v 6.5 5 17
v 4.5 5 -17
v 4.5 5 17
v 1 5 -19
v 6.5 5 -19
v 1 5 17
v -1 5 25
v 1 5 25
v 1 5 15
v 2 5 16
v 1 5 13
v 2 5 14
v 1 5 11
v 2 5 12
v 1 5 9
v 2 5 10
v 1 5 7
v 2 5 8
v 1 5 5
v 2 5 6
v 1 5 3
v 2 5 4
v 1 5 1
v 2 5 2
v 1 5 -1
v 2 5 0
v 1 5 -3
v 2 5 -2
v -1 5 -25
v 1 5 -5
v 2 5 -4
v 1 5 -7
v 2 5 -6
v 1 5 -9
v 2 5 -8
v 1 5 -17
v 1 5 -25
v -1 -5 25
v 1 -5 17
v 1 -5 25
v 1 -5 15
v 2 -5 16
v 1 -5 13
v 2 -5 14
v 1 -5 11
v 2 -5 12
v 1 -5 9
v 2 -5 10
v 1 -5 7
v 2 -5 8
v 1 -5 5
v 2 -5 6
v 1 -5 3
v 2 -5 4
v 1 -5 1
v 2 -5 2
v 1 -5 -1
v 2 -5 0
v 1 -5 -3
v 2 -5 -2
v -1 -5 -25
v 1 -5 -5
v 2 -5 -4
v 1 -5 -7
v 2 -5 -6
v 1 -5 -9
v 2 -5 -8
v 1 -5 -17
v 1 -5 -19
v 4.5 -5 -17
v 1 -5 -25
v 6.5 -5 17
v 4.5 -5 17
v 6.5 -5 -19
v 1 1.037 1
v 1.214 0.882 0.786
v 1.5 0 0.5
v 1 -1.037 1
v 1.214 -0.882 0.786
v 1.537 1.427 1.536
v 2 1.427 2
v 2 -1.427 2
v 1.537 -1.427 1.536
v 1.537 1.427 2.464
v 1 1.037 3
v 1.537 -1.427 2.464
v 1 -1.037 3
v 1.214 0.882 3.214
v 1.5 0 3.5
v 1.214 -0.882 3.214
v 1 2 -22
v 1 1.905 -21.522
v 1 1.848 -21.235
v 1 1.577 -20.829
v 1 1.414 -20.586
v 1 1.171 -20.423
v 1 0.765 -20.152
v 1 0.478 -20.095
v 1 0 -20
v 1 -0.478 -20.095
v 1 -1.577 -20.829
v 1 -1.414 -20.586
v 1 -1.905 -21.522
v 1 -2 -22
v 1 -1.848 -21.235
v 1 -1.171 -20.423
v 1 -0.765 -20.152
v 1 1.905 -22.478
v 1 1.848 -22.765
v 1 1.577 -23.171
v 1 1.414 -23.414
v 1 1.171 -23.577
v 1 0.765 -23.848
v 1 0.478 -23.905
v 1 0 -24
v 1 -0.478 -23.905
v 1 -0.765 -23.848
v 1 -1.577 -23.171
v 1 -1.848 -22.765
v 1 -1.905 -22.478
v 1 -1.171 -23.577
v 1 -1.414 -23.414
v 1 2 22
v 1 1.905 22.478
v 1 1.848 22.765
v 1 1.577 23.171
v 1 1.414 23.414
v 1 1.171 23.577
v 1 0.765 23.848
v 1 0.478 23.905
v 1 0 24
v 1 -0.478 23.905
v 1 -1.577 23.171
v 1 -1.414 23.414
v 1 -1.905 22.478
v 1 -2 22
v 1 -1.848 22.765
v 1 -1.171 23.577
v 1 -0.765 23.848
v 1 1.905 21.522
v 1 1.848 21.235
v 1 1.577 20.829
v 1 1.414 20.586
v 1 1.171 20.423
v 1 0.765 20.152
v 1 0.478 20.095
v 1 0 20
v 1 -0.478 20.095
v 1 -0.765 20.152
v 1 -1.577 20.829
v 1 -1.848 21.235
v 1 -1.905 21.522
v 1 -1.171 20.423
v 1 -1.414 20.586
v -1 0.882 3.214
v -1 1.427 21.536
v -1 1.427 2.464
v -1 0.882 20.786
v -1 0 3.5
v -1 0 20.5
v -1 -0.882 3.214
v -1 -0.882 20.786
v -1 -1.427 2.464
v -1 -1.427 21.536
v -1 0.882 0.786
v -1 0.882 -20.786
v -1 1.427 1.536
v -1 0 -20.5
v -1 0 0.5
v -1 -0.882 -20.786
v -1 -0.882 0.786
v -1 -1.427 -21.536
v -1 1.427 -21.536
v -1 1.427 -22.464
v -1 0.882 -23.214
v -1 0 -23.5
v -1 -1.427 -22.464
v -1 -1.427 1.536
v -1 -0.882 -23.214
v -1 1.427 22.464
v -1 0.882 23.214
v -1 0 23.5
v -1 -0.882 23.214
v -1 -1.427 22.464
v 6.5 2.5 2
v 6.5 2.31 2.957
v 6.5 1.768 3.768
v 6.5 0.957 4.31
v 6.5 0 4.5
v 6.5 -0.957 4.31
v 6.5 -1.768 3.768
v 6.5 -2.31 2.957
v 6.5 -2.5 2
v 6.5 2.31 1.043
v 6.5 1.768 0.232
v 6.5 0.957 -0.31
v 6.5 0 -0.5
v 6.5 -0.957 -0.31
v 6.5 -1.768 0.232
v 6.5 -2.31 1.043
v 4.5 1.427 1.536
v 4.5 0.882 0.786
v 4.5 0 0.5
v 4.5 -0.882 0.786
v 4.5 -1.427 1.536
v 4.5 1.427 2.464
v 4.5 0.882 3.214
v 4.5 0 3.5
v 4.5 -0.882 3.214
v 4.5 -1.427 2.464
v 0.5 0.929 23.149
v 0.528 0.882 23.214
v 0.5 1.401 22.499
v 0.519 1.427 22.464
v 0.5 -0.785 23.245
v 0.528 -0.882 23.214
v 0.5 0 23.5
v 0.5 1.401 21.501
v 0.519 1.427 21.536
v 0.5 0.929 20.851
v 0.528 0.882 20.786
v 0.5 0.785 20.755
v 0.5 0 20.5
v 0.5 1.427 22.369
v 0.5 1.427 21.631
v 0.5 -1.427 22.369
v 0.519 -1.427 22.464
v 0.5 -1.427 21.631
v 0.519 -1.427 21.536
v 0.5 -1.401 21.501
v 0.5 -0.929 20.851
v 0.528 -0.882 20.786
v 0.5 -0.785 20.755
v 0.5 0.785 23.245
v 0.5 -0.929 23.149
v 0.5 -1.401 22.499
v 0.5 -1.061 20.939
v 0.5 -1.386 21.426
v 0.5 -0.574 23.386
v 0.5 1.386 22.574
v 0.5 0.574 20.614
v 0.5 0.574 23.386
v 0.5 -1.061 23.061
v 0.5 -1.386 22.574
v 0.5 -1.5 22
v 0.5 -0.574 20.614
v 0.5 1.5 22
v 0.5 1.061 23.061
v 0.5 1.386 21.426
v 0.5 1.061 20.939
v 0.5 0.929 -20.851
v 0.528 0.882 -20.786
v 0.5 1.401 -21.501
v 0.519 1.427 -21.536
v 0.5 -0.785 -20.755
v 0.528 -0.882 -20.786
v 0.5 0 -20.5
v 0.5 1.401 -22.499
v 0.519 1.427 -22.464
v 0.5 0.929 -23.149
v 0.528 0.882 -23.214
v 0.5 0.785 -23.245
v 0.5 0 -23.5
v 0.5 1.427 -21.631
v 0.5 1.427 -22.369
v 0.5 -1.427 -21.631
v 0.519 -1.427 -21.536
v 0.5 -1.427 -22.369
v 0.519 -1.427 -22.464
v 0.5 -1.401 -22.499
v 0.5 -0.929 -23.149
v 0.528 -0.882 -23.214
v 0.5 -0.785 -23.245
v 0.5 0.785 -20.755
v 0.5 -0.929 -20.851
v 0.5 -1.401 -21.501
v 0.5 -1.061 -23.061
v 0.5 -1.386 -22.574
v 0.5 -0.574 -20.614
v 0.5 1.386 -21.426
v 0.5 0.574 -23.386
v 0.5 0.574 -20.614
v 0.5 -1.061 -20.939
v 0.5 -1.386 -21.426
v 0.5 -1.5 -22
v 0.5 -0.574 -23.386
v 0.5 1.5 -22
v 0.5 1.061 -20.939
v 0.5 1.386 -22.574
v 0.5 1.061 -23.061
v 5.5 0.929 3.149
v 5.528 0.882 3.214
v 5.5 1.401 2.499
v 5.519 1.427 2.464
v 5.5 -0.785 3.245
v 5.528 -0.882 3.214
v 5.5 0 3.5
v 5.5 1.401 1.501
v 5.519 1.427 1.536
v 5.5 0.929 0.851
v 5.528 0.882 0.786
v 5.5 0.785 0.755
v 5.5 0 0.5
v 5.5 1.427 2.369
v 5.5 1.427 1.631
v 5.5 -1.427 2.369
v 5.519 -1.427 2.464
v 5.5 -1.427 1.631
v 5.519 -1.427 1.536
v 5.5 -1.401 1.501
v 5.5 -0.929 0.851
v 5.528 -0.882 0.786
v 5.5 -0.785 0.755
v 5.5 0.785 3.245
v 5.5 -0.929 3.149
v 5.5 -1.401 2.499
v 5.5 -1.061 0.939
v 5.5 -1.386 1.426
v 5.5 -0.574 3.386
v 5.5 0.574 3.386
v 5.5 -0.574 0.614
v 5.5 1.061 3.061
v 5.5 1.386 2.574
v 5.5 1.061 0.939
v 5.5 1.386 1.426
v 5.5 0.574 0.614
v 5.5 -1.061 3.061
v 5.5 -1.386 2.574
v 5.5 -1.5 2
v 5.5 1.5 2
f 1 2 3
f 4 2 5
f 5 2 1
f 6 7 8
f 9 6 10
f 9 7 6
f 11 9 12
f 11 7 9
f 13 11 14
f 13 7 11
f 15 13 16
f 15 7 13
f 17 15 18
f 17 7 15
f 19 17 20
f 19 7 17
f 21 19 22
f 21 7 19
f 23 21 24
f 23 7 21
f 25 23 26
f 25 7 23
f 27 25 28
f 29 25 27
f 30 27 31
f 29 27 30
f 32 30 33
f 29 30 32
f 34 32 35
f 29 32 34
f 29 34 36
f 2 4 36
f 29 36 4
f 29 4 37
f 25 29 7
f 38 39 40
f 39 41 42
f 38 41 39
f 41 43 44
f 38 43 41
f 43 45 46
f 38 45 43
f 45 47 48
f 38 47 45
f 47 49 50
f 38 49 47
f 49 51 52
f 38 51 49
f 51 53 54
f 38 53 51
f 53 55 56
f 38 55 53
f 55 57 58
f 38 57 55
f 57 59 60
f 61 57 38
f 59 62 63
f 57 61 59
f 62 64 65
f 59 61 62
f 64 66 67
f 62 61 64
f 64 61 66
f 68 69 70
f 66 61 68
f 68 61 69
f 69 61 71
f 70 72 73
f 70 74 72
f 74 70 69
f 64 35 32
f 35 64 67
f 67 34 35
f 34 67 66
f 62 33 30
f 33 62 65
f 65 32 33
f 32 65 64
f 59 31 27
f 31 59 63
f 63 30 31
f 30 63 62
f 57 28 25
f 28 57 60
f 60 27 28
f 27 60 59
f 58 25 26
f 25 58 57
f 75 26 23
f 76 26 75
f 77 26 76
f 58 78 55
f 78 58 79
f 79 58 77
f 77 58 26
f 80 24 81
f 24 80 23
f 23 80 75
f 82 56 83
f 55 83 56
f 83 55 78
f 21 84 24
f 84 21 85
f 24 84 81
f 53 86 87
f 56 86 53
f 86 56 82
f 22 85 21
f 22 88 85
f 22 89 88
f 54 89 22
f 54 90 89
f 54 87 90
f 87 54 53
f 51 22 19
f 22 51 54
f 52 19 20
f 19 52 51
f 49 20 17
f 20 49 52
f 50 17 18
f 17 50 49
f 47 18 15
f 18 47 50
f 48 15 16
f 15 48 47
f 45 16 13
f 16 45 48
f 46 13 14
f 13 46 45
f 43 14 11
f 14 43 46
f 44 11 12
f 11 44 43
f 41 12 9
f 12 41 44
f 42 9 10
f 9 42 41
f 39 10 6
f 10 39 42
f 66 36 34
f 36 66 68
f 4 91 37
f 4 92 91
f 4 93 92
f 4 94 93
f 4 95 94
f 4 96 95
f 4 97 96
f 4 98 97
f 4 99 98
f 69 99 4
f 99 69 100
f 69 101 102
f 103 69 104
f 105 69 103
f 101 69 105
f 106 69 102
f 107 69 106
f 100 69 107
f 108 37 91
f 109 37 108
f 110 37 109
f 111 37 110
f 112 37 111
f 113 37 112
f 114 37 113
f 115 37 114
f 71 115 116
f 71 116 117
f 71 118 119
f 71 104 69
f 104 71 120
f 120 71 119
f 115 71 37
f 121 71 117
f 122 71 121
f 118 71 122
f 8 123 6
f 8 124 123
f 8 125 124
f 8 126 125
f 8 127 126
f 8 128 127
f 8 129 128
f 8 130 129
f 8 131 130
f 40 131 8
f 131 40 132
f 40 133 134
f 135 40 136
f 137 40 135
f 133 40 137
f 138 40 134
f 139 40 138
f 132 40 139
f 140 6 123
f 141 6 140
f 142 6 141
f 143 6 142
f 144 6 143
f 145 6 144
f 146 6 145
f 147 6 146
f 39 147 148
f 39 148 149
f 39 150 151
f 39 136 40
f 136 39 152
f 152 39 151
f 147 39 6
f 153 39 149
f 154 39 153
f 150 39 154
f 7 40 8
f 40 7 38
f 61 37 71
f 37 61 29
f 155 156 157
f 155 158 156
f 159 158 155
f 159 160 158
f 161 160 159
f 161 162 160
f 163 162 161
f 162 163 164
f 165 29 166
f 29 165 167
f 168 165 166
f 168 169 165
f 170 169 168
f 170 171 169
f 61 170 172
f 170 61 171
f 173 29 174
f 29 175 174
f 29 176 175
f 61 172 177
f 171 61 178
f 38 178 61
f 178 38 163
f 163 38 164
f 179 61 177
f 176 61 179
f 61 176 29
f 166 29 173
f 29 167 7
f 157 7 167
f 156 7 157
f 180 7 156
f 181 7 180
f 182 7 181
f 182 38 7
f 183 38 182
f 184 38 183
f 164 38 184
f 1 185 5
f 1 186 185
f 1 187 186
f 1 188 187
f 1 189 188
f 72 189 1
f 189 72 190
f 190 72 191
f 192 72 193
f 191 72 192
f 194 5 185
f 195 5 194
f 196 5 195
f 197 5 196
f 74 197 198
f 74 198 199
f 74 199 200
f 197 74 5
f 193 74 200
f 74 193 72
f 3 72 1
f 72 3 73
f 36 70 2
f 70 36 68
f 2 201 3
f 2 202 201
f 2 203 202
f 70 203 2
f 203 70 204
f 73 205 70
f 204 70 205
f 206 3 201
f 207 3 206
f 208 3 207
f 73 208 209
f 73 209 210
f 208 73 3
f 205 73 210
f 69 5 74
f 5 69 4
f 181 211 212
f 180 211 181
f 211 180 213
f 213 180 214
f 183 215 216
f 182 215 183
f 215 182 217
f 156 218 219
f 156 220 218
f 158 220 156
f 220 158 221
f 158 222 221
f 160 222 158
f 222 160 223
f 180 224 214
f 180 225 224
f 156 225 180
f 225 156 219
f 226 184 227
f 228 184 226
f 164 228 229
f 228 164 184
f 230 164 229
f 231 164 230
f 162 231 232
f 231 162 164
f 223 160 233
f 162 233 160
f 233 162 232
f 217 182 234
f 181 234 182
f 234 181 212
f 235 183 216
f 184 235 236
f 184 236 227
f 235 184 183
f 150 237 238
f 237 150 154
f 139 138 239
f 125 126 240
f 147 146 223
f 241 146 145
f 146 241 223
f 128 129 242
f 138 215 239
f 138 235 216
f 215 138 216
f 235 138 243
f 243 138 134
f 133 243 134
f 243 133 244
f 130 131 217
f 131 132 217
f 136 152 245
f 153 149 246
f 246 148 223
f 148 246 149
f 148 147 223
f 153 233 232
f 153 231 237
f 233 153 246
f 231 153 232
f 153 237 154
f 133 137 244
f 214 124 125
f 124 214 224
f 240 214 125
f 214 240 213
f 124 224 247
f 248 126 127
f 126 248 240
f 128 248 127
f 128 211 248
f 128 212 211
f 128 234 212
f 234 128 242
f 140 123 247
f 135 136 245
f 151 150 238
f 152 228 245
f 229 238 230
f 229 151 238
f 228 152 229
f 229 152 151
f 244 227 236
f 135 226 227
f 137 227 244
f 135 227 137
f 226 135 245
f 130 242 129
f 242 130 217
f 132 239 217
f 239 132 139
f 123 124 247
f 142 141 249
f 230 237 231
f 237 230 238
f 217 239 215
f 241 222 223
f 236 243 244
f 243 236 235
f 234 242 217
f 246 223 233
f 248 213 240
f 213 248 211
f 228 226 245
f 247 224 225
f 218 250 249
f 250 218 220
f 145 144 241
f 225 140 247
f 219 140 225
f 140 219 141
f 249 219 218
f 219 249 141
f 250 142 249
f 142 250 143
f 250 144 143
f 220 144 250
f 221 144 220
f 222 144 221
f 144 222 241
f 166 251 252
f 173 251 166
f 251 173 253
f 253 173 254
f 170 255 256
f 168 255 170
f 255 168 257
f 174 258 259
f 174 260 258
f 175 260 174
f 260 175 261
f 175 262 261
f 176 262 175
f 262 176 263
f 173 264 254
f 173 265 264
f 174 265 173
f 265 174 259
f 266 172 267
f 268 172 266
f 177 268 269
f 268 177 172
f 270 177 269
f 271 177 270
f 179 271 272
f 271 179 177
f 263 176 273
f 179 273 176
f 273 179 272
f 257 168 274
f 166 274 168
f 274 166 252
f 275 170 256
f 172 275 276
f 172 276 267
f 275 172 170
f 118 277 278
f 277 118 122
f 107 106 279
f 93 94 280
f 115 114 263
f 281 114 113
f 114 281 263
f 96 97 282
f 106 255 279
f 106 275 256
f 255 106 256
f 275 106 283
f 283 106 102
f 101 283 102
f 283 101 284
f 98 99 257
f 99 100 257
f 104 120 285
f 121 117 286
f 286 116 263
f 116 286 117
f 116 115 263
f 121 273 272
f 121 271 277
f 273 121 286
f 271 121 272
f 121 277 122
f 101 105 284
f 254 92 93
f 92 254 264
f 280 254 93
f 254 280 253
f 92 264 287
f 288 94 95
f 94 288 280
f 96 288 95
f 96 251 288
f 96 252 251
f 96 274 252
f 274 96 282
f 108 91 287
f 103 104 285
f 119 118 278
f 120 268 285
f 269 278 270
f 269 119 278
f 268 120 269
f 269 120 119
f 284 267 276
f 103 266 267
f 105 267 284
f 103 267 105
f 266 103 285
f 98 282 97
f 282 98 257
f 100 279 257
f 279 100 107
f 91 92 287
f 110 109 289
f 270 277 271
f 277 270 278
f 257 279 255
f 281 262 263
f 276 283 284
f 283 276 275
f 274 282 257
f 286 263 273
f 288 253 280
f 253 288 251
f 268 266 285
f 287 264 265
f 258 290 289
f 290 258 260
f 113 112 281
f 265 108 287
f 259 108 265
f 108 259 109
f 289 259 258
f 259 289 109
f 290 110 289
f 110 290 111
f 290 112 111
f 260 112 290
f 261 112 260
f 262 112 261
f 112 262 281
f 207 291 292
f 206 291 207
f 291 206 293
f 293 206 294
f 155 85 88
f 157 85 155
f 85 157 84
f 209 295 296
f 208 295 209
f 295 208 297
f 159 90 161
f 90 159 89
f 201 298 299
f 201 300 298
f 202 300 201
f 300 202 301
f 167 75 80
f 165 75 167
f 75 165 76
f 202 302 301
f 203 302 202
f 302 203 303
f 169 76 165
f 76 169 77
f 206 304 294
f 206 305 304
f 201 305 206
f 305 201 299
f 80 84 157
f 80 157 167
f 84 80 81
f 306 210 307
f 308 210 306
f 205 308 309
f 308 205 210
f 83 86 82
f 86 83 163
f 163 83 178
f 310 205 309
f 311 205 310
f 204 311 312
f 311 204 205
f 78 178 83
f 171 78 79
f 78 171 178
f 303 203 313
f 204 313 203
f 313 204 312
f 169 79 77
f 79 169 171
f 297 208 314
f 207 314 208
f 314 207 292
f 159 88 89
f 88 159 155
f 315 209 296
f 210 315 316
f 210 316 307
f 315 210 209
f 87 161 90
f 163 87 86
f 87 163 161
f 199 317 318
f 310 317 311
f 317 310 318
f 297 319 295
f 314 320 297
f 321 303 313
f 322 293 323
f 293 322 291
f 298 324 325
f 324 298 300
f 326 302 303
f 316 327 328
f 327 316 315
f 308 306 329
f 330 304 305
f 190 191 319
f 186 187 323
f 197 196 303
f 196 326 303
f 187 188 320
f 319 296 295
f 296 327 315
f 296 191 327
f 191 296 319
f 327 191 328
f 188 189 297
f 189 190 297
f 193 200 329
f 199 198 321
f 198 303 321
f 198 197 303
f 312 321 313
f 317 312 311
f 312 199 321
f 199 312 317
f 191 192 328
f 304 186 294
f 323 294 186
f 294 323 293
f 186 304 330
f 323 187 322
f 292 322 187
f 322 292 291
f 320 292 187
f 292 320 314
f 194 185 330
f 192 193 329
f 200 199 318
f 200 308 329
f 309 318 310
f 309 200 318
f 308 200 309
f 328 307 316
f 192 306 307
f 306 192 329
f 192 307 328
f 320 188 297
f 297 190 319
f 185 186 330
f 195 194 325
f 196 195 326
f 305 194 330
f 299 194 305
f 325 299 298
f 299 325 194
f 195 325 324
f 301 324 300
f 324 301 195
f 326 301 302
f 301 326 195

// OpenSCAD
$fs = 1;

dx = 2;
dy = 10;
dz = 50;

reso = 2;
dc = reso / 1.414;
fz = (2*8+1)*reso + 10;

es = dx+dx+reso/2 + 0.5;
r1 = 1.5;
r2 = 2.5;

module trou(dim) {
	cylinder(dim, r1, r1, true);
	translate([0,0,dim/2]) cylinder(1, r1, r2, true);
}

module fixe() {
	cube([dx,dy,dz], true);
	for(i = [-4 : 8]) {
		translate([dx/2,0,i*2])
		rotate(45,[0,1,0]) cube([dc,dy,dc], true);
	}
	translate([es,0,0])
	cube([dx,dy,fz-10], true);
	translate([es/2+dx/2,0,-9*reso]) cube([es,dy,2], true);
}

module mobile() {
	cube([dx,dy,fz], true);
	for(i = [-4 : 10]) {
		translate([dx/2,0,i*2])
		rotate(45,[0,1,0]) cube([dc,dy,dc], true);
	}
}

module adj() {
	translate([-(ax-dx)/2,0,0]) {
		difference() {
			union() {
				cube([ax,ay,az],true);	
				translate([0,-ay/2+dy+ar-ep,az/2]) rotate(90,[0,1,0]) {
					difference() {
						cylinder(ax, ar, ar, true);
						cylinder(ax, ar-ep, ar-ep, true);
					}
				}
			}
			translate([0,-ay/2+dy+(ar-ep),0]) {
				difference() {
					cube([ax,(ar-ep)*2,az], true);
					translate([0,1,0]) cube([ax,(ar-ep)*2 - 2,az], true);
				}
			}
		}
	}
}


difference() {
	fixe();
	translate([0,0,(dz/2-3)]) rotate(90,[0,1,0]) trou(dx);
	translate([0,0,-(dz/2-3)]) rotate(90,[0,1,0]) trou(dx);
	translate([0,0,2]) rotate(90,[0,1,0]) trou(12);
}


ax = 5;
ay = 25;
az = 5;
ep = 1;
ar = 5;
/*
color("Blue") {
	translate([dx+reso/2 + 0.25,0,0]) {
		difference() {
			translate([0,0,reso/2+reso*4]) {
				rotate(180,[0,1,0]) mobile();
				translate([0,ay/2-dy/2,fz/2+az/2]) adj();
			}
			translate([0,0,4]) # cube([10,3,28], true);
			translate([1.25 - ax / 2,0,reso/2+reso*4 + fz/2+az/2]) {
			 rotate(90,[1,0,0]) cylinder(dy, 1.25, 1.25, true);
			}
			translate([1.25 - ax / 2,10,reso/2+reso*4 + fz/2+az/2]) {
			 rotate(90,[0,1,0]) cylinder(dy, 1.25, 1.25, true);
			}
			translate([1.25 - ax / 2,17,reso/2+reso*4 + fz/2+az/2]) {
			 rotate(90,[0,1,0]) cylinder(dy, 1.25, 1.25, true);
			}
		}
	}
}
*/
